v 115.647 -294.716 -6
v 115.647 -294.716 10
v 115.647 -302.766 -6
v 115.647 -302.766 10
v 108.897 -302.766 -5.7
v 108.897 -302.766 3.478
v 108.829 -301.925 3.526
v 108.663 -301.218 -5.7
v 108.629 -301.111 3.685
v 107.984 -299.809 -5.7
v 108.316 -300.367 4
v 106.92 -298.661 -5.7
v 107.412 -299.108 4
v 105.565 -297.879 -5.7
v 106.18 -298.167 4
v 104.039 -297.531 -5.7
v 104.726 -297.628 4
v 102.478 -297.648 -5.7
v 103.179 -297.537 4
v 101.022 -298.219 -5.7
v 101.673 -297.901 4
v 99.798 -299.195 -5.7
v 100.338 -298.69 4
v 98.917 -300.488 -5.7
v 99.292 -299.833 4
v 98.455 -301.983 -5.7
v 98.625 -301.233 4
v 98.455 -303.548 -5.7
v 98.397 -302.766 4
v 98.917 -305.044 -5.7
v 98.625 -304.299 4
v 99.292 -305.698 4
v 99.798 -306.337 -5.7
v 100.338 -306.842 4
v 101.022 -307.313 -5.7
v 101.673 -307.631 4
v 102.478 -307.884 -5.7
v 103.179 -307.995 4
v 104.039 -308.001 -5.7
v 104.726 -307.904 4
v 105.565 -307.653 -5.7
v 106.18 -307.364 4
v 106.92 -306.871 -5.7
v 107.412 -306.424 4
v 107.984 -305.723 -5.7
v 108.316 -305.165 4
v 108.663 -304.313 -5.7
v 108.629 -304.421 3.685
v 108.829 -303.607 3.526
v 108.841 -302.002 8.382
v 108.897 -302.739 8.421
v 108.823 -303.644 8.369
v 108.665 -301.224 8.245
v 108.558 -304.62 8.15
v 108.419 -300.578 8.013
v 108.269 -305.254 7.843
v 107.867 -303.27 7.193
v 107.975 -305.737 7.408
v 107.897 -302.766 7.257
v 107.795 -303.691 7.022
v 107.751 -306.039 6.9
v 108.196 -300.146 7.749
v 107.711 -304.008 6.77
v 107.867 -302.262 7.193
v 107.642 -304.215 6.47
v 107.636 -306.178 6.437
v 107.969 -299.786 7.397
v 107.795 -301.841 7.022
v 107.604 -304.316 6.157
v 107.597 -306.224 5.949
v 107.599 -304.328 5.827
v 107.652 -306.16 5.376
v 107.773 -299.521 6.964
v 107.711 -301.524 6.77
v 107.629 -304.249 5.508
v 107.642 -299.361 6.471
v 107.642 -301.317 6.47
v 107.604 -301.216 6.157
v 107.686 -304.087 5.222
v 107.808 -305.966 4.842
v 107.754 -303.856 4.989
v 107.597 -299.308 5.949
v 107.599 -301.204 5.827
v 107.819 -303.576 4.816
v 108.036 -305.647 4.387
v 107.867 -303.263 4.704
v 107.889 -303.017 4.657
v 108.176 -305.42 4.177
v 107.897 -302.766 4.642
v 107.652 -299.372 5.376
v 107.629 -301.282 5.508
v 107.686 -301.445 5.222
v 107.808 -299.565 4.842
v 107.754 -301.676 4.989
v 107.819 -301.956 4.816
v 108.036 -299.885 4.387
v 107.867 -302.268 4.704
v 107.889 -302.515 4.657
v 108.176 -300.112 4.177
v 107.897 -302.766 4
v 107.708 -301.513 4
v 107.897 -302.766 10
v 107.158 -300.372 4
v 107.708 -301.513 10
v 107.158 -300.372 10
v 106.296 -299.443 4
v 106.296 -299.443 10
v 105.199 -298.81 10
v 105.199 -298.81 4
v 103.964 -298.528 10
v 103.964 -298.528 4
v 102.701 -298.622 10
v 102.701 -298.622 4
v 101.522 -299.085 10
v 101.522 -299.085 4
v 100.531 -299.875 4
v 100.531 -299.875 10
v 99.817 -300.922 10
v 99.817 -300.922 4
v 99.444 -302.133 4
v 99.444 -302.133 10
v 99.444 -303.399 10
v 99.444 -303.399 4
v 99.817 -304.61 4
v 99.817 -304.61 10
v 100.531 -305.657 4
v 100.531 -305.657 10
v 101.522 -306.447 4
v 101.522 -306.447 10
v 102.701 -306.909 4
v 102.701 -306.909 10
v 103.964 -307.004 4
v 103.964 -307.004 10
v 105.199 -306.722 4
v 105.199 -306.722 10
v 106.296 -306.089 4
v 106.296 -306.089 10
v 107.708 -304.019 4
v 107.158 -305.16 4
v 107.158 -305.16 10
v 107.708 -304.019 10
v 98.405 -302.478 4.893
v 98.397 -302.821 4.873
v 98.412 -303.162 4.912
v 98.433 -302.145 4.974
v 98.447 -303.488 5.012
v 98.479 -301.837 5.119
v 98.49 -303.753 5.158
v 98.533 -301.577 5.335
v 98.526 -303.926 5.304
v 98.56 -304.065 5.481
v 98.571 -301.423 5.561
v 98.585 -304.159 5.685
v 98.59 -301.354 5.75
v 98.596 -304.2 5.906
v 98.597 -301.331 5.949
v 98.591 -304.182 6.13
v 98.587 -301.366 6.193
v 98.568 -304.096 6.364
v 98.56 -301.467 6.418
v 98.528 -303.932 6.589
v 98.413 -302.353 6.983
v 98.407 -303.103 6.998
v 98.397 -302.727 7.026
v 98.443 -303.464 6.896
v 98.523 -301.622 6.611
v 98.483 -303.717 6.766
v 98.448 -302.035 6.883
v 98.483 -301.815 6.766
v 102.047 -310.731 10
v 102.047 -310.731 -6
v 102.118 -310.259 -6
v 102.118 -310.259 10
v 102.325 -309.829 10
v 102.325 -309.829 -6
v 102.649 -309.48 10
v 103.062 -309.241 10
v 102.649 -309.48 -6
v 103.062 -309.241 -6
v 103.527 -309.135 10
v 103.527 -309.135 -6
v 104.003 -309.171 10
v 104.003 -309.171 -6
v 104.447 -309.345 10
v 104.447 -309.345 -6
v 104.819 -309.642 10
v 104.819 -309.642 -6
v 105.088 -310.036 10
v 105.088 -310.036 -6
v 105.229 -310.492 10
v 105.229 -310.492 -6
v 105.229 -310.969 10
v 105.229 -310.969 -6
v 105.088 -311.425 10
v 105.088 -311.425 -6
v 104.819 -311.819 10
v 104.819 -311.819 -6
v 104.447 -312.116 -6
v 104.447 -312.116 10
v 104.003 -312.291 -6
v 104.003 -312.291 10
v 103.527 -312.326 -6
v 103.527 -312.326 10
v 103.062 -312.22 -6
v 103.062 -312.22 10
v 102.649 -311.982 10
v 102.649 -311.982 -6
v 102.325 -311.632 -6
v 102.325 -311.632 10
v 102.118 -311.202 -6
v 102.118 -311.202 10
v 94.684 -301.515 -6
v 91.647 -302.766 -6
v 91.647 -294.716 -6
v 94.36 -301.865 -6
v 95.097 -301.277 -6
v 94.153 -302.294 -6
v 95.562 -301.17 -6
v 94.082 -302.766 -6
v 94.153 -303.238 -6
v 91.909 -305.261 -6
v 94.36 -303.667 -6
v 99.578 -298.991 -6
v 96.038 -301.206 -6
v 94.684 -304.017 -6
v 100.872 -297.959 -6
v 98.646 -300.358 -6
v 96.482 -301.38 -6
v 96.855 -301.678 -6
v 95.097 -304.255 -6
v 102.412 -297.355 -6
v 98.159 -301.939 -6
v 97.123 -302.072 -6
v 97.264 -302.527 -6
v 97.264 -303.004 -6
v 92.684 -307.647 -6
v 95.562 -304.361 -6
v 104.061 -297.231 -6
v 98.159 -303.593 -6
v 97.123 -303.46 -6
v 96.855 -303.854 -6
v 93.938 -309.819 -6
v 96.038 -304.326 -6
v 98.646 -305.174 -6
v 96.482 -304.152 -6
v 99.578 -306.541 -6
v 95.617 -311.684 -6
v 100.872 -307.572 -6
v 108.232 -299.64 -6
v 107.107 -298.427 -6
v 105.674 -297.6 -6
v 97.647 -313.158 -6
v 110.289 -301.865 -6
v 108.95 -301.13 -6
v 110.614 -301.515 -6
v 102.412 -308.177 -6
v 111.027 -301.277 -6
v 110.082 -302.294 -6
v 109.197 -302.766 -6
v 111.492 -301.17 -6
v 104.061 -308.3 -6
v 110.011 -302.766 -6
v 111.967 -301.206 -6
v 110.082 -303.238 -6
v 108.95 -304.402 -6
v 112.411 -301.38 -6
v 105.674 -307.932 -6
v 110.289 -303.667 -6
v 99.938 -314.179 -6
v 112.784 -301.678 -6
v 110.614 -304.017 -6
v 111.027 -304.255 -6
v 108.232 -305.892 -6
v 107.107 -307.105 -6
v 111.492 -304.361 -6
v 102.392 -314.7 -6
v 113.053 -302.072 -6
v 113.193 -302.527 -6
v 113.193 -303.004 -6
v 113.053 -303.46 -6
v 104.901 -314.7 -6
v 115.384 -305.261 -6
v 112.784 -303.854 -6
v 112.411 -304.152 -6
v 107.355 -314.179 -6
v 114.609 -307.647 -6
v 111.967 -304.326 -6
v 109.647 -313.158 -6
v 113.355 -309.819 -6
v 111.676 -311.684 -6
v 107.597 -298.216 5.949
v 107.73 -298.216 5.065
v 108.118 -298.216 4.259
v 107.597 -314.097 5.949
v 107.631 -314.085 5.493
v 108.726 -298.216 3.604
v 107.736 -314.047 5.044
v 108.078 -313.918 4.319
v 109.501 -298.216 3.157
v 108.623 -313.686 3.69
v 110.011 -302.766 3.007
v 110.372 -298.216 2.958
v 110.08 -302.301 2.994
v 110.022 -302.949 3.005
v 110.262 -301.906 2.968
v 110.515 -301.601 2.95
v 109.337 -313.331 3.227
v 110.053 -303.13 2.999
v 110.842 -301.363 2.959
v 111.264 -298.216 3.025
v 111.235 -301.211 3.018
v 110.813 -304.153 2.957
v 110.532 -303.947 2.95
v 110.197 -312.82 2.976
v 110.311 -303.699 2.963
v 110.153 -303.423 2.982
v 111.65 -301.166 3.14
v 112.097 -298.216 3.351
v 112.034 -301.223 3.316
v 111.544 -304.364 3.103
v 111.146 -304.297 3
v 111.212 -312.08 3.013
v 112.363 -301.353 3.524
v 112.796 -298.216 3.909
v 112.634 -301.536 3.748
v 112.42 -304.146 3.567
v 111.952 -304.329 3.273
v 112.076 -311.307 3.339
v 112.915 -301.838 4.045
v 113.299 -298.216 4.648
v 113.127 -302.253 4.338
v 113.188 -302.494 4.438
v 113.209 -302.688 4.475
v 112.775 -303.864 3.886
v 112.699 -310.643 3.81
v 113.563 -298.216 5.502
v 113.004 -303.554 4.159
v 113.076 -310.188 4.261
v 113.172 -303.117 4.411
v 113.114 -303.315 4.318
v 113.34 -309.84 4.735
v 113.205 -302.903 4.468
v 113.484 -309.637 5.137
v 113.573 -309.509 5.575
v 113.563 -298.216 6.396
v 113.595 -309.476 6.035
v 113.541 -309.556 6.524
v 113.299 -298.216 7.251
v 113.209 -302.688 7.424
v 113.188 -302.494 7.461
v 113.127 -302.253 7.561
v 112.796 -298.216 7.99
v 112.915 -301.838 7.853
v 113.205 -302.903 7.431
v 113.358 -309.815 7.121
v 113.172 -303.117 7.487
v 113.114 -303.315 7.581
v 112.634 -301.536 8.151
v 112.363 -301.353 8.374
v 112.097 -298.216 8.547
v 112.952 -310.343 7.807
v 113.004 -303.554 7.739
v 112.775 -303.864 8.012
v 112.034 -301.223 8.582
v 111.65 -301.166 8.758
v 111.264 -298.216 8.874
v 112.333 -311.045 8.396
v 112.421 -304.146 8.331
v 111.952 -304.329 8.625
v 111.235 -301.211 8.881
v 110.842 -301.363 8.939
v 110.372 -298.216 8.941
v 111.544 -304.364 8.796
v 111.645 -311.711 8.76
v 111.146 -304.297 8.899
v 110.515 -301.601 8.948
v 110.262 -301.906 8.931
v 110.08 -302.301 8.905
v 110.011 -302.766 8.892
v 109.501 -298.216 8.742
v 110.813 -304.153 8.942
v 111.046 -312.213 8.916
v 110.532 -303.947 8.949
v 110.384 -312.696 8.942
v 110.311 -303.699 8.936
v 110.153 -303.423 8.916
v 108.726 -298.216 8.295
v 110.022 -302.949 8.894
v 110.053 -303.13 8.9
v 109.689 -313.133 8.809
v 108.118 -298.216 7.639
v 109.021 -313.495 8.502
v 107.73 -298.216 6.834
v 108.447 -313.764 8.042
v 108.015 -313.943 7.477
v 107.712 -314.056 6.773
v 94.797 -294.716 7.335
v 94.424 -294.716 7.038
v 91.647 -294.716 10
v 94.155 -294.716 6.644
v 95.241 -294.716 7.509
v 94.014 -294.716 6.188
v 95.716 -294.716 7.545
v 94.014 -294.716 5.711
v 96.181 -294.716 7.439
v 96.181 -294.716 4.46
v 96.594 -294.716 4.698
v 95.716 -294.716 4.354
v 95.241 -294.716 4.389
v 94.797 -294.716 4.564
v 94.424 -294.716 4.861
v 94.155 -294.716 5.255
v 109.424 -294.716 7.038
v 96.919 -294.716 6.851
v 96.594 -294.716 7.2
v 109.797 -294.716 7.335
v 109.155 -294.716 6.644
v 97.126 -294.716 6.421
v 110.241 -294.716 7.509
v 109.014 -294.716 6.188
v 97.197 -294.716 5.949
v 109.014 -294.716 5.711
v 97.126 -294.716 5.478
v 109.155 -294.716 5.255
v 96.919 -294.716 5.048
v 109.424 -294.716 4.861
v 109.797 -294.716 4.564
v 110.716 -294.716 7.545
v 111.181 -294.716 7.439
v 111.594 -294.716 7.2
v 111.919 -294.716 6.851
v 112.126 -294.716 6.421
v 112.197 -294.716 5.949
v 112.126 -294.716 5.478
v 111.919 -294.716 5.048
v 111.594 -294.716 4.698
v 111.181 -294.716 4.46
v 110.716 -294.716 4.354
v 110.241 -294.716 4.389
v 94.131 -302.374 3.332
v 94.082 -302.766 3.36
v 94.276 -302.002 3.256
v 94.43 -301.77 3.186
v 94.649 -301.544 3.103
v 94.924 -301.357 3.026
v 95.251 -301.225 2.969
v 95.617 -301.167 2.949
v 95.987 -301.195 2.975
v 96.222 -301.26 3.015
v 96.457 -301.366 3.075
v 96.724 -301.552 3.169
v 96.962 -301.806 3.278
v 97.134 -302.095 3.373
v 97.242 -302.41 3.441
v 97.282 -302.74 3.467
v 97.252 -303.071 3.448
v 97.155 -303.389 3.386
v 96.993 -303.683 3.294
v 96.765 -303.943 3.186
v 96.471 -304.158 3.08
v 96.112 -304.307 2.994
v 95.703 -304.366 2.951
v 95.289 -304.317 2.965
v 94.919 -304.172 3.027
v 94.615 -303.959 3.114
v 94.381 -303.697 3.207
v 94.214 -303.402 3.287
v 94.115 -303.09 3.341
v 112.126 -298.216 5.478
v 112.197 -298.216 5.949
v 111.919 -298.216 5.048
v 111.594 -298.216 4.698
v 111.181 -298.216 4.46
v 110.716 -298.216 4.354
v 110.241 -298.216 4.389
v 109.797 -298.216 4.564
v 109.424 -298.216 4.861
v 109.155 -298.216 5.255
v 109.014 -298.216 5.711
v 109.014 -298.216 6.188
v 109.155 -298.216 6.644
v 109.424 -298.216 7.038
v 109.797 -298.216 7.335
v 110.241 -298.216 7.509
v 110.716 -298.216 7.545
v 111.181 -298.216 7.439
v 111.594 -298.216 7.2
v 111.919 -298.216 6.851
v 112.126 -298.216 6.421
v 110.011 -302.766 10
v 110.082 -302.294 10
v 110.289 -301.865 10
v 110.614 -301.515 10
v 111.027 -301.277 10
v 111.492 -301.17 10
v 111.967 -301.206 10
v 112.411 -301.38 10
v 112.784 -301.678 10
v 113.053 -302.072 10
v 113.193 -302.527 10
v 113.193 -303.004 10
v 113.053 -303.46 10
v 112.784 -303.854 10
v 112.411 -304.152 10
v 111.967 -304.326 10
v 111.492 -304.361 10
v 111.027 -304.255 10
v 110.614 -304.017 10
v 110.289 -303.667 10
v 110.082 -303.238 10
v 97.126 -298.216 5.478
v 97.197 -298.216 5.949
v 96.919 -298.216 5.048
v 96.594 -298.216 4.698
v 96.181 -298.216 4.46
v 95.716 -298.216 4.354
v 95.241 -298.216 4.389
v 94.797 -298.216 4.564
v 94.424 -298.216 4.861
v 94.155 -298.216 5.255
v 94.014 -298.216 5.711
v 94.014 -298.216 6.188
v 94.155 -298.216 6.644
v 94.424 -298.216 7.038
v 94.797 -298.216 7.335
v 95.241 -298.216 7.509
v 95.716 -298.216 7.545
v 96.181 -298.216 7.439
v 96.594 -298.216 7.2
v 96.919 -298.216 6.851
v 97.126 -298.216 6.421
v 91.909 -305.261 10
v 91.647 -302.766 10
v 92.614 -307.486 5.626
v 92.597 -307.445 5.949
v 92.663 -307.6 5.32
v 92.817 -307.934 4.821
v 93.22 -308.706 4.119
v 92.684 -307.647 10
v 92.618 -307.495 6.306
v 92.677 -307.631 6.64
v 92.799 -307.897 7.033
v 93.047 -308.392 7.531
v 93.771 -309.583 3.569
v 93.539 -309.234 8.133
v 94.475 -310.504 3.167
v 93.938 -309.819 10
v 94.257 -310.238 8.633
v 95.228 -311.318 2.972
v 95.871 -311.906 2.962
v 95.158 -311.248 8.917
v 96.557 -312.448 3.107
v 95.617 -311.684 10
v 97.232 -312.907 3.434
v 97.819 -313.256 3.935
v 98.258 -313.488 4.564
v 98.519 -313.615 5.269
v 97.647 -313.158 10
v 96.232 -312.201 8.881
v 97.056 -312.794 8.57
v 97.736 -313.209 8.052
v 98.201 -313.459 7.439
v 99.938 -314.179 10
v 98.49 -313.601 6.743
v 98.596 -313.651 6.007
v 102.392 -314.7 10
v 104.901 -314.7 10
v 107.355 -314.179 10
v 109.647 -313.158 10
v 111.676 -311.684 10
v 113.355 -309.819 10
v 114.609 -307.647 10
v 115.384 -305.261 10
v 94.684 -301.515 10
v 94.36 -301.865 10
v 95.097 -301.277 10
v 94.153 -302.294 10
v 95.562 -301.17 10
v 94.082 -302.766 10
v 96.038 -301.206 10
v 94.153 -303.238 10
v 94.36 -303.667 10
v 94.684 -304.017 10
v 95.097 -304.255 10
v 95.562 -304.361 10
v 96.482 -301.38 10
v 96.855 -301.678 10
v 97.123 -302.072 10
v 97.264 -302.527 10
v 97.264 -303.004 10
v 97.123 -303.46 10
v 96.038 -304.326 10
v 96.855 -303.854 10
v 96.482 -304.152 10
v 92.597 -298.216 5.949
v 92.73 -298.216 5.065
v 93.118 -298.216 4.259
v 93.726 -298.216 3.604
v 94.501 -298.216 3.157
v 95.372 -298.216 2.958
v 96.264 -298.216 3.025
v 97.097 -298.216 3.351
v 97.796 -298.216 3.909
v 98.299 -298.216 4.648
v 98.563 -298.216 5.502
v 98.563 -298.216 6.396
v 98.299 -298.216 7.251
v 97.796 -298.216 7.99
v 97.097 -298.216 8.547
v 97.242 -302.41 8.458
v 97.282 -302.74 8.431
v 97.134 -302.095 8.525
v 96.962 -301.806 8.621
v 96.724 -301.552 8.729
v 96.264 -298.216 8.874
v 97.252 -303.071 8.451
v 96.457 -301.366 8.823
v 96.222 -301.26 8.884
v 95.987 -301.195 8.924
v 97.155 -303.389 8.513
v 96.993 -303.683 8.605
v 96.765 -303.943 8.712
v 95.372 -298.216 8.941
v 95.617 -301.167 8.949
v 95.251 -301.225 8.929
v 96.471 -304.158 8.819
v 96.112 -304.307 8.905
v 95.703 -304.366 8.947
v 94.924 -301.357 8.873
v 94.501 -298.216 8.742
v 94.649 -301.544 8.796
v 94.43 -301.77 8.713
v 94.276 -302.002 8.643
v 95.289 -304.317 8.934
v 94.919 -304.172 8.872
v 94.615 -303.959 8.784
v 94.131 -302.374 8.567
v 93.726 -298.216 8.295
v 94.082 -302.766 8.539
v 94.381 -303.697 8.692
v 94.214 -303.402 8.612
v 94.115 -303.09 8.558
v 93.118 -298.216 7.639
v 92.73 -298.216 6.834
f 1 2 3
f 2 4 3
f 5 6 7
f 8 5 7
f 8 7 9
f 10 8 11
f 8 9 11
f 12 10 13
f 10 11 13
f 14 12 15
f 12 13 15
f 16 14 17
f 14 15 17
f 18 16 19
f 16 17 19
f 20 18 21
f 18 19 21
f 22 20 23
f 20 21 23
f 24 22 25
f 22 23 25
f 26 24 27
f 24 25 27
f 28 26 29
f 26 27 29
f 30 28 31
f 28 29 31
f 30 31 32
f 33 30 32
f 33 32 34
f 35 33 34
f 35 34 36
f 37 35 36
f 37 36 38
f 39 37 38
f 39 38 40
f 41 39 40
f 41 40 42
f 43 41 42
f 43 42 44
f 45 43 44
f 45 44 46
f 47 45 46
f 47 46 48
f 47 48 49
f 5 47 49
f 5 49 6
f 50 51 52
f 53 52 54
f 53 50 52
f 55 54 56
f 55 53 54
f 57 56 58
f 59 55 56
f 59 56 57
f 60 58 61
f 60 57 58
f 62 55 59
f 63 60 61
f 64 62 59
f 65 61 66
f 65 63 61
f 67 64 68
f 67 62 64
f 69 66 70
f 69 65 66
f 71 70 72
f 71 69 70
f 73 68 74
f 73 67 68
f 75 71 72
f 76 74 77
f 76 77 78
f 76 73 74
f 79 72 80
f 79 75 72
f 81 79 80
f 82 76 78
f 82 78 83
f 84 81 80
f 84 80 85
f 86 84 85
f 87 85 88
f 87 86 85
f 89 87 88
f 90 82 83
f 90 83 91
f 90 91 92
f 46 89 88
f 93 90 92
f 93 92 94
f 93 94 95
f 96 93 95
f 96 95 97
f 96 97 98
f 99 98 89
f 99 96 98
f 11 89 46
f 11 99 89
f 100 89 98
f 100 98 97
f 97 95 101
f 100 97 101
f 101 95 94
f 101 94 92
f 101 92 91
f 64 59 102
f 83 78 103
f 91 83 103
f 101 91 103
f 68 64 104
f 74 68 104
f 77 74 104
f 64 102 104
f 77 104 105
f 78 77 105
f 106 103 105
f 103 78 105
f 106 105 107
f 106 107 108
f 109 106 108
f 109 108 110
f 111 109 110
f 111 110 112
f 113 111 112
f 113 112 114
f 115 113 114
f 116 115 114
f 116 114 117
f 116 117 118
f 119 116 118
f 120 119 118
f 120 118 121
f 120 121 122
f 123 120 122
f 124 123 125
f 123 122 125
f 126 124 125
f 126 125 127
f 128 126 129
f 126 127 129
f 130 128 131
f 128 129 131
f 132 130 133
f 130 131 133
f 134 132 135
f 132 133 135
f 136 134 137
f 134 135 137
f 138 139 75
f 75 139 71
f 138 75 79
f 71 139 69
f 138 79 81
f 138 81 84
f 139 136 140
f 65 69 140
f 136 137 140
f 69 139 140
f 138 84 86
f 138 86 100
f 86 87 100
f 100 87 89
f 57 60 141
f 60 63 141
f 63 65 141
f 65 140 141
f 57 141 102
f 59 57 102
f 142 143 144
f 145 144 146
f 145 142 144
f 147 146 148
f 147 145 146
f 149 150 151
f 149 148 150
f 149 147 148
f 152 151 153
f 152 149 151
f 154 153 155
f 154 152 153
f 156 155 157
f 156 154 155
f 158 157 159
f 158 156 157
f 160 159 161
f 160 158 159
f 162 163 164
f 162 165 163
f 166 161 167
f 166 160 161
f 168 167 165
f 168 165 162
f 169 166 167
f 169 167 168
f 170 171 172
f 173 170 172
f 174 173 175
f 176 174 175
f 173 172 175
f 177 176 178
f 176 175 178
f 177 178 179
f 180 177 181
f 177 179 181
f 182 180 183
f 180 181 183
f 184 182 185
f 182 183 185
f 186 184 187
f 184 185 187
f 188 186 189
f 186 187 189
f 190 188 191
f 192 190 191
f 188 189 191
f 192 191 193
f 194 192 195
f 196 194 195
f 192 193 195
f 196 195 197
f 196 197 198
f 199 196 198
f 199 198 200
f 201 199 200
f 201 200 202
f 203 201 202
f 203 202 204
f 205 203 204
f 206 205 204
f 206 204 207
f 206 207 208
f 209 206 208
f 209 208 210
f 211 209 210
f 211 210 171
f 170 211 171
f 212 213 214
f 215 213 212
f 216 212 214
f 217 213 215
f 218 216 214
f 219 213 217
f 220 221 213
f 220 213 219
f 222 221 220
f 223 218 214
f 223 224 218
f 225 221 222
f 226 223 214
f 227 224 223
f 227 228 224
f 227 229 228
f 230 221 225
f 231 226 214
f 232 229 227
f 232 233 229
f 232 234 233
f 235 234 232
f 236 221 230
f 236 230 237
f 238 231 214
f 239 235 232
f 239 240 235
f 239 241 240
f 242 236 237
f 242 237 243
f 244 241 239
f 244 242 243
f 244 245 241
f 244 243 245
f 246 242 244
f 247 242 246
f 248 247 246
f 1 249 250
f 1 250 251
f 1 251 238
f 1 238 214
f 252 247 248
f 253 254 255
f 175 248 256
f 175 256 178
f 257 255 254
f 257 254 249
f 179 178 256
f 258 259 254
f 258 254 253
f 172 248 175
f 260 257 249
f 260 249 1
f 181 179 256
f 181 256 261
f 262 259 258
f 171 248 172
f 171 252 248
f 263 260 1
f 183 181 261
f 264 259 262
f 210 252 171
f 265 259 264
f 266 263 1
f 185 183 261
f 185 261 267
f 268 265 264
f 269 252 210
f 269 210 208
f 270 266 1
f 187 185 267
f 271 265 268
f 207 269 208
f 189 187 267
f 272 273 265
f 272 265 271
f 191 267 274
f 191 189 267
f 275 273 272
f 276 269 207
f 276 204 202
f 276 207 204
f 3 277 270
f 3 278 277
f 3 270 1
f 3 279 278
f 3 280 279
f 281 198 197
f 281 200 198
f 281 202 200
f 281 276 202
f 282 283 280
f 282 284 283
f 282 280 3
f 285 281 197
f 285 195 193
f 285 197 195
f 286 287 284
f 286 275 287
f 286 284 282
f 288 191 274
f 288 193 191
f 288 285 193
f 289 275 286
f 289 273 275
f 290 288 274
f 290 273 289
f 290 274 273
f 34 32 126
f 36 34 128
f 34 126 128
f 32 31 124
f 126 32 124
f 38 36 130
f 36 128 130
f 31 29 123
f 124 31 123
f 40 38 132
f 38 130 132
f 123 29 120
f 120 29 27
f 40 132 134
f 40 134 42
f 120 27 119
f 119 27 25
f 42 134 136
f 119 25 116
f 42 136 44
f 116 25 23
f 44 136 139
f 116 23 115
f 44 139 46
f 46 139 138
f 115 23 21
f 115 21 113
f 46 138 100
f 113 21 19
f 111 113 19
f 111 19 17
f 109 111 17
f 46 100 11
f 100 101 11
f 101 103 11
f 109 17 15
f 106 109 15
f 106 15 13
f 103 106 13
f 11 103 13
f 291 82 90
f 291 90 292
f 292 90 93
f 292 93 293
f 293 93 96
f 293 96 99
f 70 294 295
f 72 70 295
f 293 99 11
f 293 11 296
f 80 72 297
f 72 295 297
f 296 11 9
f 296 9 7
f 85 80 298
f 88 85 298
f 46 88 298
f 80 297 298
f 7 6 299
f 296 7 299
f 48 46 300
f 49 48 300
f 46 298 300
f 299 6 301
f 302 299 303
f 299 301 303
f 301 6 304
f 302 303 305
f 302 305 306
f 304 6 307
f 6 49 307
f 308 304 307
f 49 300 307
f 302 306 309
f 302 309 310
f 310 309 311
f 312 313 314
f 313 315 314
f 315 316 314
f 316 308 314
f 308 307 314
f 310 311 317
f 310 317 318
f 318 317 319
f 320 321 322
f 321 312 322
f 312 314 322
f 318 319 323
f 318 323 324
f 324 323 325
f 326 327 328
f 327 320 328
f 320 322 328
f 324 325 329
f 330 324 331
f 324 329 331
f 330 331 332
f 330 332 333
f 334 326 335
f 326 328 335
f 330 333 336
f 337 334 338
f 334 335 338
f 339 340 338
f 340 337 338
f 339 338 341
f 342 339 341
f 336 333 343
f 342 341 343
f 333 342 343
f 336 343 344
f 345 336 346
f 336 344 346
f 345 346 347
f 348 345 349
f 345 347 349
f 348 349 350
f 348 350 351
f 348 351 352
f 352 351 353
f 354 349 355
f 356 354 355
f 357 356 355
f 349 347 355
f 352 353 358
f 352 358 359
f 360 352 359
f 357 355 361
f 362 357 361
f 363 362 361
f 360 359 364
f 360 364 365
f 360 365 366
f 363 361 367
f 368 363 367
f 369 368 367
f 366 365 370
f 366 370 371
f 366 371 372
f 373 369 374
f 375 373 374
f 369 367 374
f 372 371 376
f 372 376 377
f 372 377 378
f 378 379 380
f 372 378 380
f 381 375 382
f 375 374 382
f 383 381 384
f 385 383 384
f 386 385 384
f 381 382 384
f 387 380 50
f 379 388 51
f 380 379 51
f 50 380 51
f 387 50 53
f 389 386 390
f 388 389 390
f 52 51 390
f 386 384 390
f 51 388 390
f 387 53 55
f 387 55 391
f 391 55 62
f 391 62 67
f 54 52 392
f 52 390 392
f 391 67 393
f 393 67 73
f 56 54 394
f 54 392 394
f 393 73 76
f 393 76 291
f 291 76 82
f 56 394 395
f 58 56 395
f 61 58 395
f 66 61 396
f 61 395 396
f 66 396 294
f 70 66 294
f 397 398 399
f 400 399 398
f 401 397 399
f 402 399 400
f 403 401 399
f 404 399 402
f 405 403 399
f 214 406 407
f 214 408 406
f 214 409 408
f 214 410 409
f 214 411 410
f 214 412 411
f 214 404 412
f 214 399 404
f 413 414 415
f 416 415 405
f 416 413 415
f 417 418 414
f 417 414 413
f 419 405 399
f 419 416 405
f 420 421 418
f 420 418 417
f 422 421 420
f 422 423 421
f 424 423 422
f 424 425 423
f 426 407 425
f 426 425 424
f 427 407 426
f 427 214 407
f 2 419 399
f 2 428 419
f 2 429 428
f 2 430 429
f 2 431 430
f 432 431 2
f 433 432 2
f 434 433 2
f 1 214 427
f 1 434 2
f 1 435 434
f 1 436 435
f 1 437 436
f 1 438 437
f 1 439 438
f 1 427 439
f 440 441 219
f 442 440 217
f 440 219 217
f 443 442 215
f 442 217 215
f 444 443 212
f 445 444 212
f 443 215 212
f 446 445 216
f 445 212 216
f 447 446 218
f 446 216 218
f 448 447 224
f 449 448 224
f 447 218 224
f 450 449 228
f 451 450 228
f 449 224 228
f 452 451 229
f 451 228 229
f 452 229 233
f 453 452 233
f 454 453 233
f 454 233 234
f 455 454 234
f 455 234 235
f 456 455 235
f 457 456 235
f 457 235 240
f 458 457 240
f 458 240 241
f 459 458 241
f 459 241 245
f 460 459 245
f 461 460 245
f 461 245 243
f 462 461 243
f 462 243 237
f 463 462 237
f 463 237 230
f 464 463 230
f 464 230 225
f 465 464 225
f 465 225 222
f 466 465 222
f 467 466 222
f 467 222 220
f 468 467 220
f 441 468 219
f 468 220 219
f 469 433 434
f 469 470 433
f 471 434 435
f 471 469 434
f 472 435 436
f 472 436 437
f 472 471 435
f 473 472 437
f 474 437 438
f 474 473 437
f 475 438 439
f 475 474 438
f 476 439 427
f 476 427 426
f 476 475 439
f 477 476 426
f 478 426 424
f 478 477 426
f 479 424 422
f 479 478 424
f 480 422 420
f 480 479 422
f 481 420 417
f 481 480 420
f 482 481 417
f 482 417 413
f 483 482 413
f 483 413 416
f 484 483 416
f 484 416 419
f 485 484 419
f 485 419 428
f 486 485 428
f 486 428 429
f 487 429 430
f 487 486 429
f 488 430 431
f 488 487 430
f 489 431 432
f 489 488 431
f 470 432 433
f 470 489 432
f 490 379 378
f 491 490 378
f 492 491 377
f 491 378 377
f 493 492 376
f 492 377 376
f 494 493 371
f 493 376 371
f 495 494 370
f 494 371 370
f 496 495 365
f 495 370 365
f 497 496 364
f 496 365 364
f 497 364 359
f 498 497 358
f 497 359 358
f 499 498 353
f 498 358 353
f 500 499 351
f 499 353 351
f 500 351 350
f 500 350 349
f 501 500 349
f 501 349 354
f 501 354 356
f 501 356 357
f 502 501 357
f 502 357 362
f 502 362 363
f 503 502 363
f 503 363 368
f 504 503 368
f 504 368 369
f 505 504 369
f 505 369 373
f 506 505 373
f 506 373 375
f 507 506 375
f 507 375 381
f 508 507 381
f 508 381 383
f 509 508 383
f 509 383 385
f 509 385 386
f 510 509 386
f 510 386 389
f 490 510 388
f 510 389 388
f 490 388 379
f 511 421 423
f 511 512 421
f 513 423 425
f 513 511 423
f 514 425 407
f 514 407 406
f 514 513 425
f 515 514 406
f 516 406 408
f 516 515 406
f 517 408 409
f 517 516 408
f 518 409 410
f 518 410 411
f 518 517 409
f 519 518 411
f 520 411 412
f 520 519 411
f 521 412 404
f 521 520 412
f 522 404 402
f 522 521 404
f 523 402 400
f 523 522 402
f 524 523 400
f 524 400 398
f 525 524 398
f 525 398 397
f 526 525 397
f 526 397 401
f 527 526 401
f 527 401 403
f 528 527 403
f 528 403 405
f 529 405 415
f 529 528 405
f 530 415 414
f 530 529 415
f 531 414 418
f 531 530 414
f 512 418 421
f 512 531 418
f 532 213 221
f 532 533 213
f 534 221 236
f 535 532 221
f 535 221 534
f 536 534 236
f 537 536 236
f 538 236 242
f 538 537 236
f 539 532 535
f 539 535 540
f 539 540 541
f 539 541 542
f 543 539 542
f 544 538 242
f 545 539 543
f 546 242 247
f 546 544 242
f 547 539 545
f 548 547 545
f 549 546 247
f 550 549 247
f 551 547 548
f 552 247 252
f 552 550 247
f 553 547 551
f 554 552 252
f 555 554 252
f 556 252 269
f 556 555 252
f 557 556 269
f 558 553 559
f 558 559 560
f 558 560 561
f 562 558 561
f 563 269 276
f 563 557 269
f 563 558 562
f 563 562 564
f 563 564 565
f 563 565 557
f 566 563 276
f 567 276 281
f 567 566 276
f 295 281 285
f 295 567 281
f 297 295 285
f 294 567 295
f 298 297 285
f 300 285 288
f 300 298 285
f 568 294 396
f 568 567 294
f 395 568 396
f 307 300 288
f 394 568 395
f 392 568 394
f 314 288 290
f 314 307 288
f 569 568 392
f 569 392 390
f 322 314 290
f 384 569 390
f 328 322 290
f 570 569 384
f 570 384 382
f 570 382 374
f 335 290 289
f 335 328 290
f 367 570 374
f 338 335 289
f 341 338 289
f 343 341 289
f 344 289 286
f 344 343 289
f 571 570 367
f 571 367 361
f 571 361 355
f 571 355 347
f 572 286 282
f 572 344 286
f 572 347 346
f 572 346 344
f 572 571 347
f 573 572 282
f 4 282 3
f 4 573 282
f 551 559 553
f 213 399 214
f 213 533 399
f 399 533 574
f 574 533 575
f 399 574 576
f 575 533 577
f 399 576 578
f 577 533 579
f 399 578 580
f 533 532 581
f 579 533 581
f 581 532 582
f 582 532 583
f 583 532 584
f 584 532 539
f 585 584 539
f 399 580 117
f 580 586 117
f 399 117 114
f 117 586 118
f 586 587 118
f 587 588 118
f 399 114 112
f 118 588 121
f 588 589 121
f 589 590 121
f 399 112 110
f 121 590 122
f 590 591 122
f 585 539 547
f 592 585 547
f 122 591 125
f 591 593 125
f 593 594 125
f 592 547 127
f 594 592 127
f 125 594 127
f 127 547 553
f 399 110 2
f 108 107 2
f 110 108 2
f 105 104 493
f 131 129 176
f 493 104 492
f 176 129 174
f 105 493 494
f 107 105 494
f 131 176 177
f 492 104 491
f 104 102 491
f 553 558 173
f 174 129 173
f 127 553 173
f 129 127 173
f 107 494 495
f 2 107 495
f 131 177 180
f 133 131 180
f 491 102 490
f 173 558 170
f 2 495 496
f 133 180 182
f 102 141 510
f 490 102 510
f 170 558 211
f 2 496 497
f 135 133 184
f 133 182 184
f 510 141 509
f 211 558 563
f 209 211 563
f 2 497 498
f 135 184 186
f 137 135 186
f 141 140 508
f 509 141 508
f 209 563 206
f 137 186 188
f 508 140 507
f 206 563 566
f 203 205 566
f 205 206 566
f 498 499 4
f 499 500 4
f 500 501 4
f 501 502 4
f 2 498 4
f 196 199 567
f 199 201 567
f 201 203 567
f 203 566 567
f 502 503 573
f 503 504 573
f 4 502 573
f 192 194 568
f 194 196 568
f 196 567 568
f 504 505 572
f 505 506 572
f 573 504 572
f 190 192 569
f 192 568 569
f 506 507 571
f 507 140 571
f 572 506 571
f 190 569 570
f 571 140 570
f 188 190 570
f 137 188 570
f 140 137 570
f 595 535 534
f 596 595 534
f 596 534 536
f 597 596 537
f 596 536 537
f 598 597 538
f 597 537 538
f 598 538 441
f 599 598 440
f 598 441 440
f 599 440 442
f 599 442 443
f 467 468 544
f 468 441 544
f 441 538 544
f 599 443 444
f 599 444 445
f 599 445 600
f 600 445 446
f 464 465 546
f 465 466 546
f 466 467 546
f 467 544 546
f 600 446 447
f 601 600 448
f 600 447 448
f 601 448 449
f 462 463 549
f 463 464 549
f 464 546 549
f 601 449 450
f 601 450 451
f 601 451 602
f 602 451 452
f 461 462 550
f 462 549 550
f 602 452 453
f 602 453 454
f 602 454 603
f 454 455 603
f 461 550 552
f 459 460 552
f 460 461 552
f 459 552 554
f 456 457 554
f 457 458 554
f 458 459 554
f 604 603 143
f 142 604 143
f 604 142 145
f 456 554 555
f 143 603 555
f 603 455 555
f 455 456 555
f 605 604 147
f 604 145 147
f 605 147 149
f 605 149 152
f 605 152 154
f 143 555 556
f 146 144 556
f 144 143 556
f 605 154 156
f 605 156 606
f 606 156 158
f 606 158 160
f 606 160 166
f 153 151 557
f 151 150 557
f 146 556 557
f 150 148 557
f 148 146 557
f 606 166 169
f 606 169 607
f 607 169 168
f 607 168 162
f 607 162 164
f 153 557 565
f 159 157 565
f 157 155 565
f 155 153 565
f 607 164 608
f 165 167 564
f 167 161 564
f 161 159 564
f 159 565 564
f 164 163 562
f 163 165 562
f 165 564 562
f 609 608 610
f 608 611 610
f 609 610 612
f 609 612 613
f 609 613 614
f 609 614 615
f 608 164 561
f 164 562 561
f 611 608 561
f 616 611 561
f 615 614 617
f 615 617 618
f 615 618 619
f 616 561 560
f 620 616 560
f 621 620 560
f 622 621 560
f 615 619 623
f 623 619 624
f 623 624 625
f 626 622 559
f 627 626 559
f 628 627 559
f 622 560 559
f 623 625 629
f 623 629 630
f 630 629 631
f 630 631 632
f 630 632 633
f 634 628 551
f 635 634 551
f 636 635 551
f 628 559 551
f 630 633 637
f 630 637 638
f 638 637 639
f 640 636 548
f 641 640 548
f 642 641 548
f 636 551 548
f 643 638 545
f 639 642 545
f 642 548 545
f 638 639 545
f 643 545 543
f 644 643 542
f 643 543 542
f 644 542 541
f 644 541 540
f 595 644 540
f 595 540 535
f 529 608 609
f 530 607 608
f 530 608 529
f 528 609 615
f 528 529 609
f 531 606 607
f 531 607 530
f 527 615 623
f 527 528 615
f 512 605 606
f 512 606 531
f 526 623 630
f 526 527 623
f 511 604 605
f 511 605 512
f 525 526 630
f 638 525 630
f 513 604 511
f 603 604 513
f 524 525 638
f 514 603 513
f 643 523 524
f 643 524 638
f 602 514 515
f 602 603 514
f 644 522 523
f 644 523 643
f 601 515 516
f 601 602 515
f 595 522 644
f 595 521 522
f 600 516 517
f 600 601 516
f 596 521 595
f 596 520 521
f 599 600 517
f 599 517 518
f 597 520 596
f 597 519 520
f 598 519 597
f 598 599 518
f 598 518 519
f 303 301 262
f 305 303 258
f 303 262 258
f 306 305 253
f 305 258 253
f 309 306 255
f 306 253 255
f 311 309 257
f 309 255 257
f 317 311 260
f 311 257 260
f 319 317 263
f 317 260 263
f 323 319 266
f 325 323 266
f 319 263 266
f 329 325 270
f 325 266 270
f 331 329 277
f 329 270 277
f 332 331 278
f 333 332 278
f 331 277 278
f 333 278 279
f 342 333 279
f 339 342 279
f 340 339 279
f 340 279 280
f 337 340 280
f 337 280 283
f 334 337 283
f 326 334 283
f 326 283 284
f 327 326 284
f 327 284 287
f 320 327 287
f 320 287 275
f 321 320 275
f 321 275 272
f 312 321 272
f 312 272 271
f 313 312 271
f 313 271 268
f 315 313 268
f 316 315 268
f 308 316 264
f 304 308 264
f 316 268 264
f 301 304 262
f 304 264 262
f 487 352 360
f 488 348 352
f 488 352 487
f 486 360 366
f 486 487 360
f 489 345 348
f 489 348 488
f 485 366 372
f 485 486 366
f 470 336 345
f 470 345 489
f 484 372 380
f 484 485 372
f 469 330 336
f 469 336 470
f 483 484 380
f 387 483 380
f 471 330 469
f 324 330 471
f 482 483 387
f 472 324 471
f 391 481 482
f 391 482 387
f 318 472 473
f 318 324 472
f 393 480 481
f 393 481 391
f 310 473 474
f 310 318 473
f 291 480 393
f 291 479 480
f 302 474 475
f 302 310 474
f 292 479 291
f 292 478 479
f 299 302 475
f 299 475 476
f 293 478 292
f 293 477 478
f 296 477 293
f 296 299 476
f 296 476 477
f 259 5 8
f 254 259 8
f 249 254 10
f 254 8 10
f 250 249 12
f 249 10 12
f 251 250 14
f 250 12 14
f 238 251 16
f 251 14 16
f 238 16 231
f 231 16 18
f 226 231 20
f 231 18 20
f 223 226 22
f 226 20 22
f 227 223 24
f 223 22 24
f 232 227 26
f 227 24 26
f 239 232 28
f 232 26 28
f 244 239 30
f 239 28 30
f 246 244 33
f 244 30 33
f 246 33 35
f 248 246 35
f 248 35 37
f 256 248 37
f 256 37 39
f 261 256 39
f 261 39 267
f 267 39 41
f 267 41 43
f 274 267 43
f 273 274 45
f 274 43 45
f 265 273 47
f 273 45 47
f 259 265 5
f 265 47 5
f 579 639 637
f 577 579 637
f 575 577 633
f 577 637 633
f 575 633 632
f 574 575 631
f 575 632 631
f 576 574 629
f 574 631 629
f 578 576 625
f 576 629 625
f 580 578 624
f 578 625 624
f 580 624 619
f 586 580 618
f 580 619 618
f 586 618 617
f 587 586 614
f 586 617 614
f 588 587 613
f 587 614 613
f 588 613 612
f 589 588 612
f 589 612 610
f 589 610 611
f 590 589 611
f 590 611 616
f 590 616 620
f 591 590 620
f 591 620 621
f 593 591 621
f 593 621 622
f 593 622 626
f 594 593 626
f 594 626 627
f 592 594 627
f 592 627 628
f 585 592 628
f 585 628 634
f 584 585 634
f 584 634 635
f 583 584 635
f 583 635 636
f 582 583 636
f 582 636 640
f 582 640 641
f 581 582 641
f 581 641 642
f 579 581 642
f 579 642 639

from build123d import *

# Parameters (mm, degrees)
RESSALTO_EXTRUS_O1_DEPTH                = 10
RESSALTO_EXTRUS_O1_DEPTH_BACK           = 6
ESBO_O2_R                               = 5.25
CORTE_EXTRUS_O1_DEPTH                   = 16
CORTE_EXTRUS_O1_DEPTH_BACK              = 31.8
M3_CLEARANCE_HOLE5_D                    = 3.2
CBORE_FOR_M5_HEX_HEAD_BOLT1_D           = 3.2
CBORE_FOR_M5_HEX_HEAD_BOLT1_CBORE_D     = 6
CBORE_FOR_M5_HEX_HEAD_BOLT1_CBORE_DEPTH = 16.5
SKETCH11_W                              = 24
SKETCH11_H                              = 16
SKETCH11_R                              = 1.6
BOSS_EXTRUDE3_DEPTH                     = 1
SKETCH12_R                              = 5.25
SKETCH12_R_2                            = 4.25
BOSS_EXTRUDE5_DEPTH                     = 6
CHAMFER1_SIZE                           = 0.3
SKETCH13_R                              = 3
CUT_EXTRUDE1_DEPTH                      = 43.8


with BuildPart() as part:
    # Esboço1 → Ressalto-extrusão1 (new body, two sides)
    with BuildSketch(Plane.XY) as ressalto_extrus_o1_sk:
        with BuildLine():
            Line((115.646593224, -302.7659332), (115.646593224, -295.7159332))
            Line((115.646593224, -295.7159332), (91.646593224, -295.7159332))
            Line((91.646593224, -295.7159332), (91.646593224, -302.7659332))
            ThreePointArc((91.646593224, -302.7659332), (103.646593224, -314.7659332), (115.646593224, -302.7659332))
        make_face()
    extrude(amount=RESSALTO_EXTRUS_O1_DEPTH)
    extrude(ressalto_extrus_o1_sk.sketch, amount=-RESSALTO_EXTRUS_O1_DEPTH_BACK)

    # Esboço2 → Corte-extrusão1 (cut, two sides)
    with BuildSketch(Plane.XY.offset(10)) as corte_extrus_o1_sk:
        with Locations((103.646593224, -302.7659332)):
            Circle(ESBO_O2_R)
    extrude(amount=CORTE_EXTRUS_O1_DEPTH, mode=Mode.SUBTRACT)
    extrude(corte_extrus_o1_sk.sketch, amount=-CORTE_EXTRUS_O1_DEPTH_BACK, mode=Mode.SUBTRACT)

    # M3 Clearance Hole5 (through all)
    with Locations(Plane.XY.offset(10)):
        with Locations((95.681870132, -302.765933199), (103.646593224, -310.730656291), (111.611316315, -302.765933199)):
            Hole(M3_CLEARANCE_HOLE5_D / 2)

    # CBORE for M5 Hex Head Bolt1 (through all)
    with Locations(Plane(origin=(0, -314.7159332, 0), x_dir=(-1, 0, 0), z_dir=(0, -1, 0))):
        with Locations((-95.596593224, -5.949346208), (-110.596593224, -5.949346208)):
            CounterBoreHole(CBORE_FOR_M5_HEX_HEAD_BOLT1_D / 2, CBORE_FOR_M5_HEX_HEAD_BOLT1_CBORE_D / 2, CBORE_FOR_M5_HEX_HEAD_BOLT1_CBORE_DEPTH)

    # Sketch11 → Boss-Extrude3 (add)
    with BuildSketch(Plane(origin=(0, -295.7159332, 0), x_dir=(1, 0, 0), z_dir=(0, 1, 0))):
        with Locations((103.646593224, -2)):
            Rectangle(SKETCH11_W, SKETCH11_H)
        with Locations((95.596593224, -5.949346208)):
            Circle(SKETCH11_R, mode=Mode.SUBTRACT)
        with Locations((110.596593224, -5.949346208)):
            Circle(SKETCH11_R, mode=Mode.SUBTRACT)
    extrude(amount=BOSS_EXTRUDE3_DEPTH)

    # Sketch12 → Boss-Extrude5 (add)
    with BuildSketch(Plane.XY.offset(10)):
        with Locations((103.646593224, -302.7659332)):
            Circle(SKETCH12_R)
        with Locations((103.646593224, -302.7659332)):
            Circle(SKETCH12_R_2, mode=Mode.SUBTRACT)
    extrude(amount=-BOSS_EXTRUDE5_DEPTH)

    # Chamfer1
    chamfer1_edges = [part.edges().sort_by_distance(p)[0] for p in [
        (98.396593224, -302.7659332, -6),
    ]]
    chamfer(chamfer1_edges, length=CHAMFER1_SIZE)

    # Sketch13 → Cut-Extrude1 (cut)
    with BuildSketch(Plane.XZ.offset(298.2159332)):
        with Locations((95.596593224, 5.949346208)):
            Circle(SKETCH13_R)
        with Locations((110.596593224, 5.949346208)):
            Circle(SKETCH13_R)
    extrude(amount=CUT_EXTRUDE1_DEPTH, mode=Mode.SUBTRACT)


solid = part.part
